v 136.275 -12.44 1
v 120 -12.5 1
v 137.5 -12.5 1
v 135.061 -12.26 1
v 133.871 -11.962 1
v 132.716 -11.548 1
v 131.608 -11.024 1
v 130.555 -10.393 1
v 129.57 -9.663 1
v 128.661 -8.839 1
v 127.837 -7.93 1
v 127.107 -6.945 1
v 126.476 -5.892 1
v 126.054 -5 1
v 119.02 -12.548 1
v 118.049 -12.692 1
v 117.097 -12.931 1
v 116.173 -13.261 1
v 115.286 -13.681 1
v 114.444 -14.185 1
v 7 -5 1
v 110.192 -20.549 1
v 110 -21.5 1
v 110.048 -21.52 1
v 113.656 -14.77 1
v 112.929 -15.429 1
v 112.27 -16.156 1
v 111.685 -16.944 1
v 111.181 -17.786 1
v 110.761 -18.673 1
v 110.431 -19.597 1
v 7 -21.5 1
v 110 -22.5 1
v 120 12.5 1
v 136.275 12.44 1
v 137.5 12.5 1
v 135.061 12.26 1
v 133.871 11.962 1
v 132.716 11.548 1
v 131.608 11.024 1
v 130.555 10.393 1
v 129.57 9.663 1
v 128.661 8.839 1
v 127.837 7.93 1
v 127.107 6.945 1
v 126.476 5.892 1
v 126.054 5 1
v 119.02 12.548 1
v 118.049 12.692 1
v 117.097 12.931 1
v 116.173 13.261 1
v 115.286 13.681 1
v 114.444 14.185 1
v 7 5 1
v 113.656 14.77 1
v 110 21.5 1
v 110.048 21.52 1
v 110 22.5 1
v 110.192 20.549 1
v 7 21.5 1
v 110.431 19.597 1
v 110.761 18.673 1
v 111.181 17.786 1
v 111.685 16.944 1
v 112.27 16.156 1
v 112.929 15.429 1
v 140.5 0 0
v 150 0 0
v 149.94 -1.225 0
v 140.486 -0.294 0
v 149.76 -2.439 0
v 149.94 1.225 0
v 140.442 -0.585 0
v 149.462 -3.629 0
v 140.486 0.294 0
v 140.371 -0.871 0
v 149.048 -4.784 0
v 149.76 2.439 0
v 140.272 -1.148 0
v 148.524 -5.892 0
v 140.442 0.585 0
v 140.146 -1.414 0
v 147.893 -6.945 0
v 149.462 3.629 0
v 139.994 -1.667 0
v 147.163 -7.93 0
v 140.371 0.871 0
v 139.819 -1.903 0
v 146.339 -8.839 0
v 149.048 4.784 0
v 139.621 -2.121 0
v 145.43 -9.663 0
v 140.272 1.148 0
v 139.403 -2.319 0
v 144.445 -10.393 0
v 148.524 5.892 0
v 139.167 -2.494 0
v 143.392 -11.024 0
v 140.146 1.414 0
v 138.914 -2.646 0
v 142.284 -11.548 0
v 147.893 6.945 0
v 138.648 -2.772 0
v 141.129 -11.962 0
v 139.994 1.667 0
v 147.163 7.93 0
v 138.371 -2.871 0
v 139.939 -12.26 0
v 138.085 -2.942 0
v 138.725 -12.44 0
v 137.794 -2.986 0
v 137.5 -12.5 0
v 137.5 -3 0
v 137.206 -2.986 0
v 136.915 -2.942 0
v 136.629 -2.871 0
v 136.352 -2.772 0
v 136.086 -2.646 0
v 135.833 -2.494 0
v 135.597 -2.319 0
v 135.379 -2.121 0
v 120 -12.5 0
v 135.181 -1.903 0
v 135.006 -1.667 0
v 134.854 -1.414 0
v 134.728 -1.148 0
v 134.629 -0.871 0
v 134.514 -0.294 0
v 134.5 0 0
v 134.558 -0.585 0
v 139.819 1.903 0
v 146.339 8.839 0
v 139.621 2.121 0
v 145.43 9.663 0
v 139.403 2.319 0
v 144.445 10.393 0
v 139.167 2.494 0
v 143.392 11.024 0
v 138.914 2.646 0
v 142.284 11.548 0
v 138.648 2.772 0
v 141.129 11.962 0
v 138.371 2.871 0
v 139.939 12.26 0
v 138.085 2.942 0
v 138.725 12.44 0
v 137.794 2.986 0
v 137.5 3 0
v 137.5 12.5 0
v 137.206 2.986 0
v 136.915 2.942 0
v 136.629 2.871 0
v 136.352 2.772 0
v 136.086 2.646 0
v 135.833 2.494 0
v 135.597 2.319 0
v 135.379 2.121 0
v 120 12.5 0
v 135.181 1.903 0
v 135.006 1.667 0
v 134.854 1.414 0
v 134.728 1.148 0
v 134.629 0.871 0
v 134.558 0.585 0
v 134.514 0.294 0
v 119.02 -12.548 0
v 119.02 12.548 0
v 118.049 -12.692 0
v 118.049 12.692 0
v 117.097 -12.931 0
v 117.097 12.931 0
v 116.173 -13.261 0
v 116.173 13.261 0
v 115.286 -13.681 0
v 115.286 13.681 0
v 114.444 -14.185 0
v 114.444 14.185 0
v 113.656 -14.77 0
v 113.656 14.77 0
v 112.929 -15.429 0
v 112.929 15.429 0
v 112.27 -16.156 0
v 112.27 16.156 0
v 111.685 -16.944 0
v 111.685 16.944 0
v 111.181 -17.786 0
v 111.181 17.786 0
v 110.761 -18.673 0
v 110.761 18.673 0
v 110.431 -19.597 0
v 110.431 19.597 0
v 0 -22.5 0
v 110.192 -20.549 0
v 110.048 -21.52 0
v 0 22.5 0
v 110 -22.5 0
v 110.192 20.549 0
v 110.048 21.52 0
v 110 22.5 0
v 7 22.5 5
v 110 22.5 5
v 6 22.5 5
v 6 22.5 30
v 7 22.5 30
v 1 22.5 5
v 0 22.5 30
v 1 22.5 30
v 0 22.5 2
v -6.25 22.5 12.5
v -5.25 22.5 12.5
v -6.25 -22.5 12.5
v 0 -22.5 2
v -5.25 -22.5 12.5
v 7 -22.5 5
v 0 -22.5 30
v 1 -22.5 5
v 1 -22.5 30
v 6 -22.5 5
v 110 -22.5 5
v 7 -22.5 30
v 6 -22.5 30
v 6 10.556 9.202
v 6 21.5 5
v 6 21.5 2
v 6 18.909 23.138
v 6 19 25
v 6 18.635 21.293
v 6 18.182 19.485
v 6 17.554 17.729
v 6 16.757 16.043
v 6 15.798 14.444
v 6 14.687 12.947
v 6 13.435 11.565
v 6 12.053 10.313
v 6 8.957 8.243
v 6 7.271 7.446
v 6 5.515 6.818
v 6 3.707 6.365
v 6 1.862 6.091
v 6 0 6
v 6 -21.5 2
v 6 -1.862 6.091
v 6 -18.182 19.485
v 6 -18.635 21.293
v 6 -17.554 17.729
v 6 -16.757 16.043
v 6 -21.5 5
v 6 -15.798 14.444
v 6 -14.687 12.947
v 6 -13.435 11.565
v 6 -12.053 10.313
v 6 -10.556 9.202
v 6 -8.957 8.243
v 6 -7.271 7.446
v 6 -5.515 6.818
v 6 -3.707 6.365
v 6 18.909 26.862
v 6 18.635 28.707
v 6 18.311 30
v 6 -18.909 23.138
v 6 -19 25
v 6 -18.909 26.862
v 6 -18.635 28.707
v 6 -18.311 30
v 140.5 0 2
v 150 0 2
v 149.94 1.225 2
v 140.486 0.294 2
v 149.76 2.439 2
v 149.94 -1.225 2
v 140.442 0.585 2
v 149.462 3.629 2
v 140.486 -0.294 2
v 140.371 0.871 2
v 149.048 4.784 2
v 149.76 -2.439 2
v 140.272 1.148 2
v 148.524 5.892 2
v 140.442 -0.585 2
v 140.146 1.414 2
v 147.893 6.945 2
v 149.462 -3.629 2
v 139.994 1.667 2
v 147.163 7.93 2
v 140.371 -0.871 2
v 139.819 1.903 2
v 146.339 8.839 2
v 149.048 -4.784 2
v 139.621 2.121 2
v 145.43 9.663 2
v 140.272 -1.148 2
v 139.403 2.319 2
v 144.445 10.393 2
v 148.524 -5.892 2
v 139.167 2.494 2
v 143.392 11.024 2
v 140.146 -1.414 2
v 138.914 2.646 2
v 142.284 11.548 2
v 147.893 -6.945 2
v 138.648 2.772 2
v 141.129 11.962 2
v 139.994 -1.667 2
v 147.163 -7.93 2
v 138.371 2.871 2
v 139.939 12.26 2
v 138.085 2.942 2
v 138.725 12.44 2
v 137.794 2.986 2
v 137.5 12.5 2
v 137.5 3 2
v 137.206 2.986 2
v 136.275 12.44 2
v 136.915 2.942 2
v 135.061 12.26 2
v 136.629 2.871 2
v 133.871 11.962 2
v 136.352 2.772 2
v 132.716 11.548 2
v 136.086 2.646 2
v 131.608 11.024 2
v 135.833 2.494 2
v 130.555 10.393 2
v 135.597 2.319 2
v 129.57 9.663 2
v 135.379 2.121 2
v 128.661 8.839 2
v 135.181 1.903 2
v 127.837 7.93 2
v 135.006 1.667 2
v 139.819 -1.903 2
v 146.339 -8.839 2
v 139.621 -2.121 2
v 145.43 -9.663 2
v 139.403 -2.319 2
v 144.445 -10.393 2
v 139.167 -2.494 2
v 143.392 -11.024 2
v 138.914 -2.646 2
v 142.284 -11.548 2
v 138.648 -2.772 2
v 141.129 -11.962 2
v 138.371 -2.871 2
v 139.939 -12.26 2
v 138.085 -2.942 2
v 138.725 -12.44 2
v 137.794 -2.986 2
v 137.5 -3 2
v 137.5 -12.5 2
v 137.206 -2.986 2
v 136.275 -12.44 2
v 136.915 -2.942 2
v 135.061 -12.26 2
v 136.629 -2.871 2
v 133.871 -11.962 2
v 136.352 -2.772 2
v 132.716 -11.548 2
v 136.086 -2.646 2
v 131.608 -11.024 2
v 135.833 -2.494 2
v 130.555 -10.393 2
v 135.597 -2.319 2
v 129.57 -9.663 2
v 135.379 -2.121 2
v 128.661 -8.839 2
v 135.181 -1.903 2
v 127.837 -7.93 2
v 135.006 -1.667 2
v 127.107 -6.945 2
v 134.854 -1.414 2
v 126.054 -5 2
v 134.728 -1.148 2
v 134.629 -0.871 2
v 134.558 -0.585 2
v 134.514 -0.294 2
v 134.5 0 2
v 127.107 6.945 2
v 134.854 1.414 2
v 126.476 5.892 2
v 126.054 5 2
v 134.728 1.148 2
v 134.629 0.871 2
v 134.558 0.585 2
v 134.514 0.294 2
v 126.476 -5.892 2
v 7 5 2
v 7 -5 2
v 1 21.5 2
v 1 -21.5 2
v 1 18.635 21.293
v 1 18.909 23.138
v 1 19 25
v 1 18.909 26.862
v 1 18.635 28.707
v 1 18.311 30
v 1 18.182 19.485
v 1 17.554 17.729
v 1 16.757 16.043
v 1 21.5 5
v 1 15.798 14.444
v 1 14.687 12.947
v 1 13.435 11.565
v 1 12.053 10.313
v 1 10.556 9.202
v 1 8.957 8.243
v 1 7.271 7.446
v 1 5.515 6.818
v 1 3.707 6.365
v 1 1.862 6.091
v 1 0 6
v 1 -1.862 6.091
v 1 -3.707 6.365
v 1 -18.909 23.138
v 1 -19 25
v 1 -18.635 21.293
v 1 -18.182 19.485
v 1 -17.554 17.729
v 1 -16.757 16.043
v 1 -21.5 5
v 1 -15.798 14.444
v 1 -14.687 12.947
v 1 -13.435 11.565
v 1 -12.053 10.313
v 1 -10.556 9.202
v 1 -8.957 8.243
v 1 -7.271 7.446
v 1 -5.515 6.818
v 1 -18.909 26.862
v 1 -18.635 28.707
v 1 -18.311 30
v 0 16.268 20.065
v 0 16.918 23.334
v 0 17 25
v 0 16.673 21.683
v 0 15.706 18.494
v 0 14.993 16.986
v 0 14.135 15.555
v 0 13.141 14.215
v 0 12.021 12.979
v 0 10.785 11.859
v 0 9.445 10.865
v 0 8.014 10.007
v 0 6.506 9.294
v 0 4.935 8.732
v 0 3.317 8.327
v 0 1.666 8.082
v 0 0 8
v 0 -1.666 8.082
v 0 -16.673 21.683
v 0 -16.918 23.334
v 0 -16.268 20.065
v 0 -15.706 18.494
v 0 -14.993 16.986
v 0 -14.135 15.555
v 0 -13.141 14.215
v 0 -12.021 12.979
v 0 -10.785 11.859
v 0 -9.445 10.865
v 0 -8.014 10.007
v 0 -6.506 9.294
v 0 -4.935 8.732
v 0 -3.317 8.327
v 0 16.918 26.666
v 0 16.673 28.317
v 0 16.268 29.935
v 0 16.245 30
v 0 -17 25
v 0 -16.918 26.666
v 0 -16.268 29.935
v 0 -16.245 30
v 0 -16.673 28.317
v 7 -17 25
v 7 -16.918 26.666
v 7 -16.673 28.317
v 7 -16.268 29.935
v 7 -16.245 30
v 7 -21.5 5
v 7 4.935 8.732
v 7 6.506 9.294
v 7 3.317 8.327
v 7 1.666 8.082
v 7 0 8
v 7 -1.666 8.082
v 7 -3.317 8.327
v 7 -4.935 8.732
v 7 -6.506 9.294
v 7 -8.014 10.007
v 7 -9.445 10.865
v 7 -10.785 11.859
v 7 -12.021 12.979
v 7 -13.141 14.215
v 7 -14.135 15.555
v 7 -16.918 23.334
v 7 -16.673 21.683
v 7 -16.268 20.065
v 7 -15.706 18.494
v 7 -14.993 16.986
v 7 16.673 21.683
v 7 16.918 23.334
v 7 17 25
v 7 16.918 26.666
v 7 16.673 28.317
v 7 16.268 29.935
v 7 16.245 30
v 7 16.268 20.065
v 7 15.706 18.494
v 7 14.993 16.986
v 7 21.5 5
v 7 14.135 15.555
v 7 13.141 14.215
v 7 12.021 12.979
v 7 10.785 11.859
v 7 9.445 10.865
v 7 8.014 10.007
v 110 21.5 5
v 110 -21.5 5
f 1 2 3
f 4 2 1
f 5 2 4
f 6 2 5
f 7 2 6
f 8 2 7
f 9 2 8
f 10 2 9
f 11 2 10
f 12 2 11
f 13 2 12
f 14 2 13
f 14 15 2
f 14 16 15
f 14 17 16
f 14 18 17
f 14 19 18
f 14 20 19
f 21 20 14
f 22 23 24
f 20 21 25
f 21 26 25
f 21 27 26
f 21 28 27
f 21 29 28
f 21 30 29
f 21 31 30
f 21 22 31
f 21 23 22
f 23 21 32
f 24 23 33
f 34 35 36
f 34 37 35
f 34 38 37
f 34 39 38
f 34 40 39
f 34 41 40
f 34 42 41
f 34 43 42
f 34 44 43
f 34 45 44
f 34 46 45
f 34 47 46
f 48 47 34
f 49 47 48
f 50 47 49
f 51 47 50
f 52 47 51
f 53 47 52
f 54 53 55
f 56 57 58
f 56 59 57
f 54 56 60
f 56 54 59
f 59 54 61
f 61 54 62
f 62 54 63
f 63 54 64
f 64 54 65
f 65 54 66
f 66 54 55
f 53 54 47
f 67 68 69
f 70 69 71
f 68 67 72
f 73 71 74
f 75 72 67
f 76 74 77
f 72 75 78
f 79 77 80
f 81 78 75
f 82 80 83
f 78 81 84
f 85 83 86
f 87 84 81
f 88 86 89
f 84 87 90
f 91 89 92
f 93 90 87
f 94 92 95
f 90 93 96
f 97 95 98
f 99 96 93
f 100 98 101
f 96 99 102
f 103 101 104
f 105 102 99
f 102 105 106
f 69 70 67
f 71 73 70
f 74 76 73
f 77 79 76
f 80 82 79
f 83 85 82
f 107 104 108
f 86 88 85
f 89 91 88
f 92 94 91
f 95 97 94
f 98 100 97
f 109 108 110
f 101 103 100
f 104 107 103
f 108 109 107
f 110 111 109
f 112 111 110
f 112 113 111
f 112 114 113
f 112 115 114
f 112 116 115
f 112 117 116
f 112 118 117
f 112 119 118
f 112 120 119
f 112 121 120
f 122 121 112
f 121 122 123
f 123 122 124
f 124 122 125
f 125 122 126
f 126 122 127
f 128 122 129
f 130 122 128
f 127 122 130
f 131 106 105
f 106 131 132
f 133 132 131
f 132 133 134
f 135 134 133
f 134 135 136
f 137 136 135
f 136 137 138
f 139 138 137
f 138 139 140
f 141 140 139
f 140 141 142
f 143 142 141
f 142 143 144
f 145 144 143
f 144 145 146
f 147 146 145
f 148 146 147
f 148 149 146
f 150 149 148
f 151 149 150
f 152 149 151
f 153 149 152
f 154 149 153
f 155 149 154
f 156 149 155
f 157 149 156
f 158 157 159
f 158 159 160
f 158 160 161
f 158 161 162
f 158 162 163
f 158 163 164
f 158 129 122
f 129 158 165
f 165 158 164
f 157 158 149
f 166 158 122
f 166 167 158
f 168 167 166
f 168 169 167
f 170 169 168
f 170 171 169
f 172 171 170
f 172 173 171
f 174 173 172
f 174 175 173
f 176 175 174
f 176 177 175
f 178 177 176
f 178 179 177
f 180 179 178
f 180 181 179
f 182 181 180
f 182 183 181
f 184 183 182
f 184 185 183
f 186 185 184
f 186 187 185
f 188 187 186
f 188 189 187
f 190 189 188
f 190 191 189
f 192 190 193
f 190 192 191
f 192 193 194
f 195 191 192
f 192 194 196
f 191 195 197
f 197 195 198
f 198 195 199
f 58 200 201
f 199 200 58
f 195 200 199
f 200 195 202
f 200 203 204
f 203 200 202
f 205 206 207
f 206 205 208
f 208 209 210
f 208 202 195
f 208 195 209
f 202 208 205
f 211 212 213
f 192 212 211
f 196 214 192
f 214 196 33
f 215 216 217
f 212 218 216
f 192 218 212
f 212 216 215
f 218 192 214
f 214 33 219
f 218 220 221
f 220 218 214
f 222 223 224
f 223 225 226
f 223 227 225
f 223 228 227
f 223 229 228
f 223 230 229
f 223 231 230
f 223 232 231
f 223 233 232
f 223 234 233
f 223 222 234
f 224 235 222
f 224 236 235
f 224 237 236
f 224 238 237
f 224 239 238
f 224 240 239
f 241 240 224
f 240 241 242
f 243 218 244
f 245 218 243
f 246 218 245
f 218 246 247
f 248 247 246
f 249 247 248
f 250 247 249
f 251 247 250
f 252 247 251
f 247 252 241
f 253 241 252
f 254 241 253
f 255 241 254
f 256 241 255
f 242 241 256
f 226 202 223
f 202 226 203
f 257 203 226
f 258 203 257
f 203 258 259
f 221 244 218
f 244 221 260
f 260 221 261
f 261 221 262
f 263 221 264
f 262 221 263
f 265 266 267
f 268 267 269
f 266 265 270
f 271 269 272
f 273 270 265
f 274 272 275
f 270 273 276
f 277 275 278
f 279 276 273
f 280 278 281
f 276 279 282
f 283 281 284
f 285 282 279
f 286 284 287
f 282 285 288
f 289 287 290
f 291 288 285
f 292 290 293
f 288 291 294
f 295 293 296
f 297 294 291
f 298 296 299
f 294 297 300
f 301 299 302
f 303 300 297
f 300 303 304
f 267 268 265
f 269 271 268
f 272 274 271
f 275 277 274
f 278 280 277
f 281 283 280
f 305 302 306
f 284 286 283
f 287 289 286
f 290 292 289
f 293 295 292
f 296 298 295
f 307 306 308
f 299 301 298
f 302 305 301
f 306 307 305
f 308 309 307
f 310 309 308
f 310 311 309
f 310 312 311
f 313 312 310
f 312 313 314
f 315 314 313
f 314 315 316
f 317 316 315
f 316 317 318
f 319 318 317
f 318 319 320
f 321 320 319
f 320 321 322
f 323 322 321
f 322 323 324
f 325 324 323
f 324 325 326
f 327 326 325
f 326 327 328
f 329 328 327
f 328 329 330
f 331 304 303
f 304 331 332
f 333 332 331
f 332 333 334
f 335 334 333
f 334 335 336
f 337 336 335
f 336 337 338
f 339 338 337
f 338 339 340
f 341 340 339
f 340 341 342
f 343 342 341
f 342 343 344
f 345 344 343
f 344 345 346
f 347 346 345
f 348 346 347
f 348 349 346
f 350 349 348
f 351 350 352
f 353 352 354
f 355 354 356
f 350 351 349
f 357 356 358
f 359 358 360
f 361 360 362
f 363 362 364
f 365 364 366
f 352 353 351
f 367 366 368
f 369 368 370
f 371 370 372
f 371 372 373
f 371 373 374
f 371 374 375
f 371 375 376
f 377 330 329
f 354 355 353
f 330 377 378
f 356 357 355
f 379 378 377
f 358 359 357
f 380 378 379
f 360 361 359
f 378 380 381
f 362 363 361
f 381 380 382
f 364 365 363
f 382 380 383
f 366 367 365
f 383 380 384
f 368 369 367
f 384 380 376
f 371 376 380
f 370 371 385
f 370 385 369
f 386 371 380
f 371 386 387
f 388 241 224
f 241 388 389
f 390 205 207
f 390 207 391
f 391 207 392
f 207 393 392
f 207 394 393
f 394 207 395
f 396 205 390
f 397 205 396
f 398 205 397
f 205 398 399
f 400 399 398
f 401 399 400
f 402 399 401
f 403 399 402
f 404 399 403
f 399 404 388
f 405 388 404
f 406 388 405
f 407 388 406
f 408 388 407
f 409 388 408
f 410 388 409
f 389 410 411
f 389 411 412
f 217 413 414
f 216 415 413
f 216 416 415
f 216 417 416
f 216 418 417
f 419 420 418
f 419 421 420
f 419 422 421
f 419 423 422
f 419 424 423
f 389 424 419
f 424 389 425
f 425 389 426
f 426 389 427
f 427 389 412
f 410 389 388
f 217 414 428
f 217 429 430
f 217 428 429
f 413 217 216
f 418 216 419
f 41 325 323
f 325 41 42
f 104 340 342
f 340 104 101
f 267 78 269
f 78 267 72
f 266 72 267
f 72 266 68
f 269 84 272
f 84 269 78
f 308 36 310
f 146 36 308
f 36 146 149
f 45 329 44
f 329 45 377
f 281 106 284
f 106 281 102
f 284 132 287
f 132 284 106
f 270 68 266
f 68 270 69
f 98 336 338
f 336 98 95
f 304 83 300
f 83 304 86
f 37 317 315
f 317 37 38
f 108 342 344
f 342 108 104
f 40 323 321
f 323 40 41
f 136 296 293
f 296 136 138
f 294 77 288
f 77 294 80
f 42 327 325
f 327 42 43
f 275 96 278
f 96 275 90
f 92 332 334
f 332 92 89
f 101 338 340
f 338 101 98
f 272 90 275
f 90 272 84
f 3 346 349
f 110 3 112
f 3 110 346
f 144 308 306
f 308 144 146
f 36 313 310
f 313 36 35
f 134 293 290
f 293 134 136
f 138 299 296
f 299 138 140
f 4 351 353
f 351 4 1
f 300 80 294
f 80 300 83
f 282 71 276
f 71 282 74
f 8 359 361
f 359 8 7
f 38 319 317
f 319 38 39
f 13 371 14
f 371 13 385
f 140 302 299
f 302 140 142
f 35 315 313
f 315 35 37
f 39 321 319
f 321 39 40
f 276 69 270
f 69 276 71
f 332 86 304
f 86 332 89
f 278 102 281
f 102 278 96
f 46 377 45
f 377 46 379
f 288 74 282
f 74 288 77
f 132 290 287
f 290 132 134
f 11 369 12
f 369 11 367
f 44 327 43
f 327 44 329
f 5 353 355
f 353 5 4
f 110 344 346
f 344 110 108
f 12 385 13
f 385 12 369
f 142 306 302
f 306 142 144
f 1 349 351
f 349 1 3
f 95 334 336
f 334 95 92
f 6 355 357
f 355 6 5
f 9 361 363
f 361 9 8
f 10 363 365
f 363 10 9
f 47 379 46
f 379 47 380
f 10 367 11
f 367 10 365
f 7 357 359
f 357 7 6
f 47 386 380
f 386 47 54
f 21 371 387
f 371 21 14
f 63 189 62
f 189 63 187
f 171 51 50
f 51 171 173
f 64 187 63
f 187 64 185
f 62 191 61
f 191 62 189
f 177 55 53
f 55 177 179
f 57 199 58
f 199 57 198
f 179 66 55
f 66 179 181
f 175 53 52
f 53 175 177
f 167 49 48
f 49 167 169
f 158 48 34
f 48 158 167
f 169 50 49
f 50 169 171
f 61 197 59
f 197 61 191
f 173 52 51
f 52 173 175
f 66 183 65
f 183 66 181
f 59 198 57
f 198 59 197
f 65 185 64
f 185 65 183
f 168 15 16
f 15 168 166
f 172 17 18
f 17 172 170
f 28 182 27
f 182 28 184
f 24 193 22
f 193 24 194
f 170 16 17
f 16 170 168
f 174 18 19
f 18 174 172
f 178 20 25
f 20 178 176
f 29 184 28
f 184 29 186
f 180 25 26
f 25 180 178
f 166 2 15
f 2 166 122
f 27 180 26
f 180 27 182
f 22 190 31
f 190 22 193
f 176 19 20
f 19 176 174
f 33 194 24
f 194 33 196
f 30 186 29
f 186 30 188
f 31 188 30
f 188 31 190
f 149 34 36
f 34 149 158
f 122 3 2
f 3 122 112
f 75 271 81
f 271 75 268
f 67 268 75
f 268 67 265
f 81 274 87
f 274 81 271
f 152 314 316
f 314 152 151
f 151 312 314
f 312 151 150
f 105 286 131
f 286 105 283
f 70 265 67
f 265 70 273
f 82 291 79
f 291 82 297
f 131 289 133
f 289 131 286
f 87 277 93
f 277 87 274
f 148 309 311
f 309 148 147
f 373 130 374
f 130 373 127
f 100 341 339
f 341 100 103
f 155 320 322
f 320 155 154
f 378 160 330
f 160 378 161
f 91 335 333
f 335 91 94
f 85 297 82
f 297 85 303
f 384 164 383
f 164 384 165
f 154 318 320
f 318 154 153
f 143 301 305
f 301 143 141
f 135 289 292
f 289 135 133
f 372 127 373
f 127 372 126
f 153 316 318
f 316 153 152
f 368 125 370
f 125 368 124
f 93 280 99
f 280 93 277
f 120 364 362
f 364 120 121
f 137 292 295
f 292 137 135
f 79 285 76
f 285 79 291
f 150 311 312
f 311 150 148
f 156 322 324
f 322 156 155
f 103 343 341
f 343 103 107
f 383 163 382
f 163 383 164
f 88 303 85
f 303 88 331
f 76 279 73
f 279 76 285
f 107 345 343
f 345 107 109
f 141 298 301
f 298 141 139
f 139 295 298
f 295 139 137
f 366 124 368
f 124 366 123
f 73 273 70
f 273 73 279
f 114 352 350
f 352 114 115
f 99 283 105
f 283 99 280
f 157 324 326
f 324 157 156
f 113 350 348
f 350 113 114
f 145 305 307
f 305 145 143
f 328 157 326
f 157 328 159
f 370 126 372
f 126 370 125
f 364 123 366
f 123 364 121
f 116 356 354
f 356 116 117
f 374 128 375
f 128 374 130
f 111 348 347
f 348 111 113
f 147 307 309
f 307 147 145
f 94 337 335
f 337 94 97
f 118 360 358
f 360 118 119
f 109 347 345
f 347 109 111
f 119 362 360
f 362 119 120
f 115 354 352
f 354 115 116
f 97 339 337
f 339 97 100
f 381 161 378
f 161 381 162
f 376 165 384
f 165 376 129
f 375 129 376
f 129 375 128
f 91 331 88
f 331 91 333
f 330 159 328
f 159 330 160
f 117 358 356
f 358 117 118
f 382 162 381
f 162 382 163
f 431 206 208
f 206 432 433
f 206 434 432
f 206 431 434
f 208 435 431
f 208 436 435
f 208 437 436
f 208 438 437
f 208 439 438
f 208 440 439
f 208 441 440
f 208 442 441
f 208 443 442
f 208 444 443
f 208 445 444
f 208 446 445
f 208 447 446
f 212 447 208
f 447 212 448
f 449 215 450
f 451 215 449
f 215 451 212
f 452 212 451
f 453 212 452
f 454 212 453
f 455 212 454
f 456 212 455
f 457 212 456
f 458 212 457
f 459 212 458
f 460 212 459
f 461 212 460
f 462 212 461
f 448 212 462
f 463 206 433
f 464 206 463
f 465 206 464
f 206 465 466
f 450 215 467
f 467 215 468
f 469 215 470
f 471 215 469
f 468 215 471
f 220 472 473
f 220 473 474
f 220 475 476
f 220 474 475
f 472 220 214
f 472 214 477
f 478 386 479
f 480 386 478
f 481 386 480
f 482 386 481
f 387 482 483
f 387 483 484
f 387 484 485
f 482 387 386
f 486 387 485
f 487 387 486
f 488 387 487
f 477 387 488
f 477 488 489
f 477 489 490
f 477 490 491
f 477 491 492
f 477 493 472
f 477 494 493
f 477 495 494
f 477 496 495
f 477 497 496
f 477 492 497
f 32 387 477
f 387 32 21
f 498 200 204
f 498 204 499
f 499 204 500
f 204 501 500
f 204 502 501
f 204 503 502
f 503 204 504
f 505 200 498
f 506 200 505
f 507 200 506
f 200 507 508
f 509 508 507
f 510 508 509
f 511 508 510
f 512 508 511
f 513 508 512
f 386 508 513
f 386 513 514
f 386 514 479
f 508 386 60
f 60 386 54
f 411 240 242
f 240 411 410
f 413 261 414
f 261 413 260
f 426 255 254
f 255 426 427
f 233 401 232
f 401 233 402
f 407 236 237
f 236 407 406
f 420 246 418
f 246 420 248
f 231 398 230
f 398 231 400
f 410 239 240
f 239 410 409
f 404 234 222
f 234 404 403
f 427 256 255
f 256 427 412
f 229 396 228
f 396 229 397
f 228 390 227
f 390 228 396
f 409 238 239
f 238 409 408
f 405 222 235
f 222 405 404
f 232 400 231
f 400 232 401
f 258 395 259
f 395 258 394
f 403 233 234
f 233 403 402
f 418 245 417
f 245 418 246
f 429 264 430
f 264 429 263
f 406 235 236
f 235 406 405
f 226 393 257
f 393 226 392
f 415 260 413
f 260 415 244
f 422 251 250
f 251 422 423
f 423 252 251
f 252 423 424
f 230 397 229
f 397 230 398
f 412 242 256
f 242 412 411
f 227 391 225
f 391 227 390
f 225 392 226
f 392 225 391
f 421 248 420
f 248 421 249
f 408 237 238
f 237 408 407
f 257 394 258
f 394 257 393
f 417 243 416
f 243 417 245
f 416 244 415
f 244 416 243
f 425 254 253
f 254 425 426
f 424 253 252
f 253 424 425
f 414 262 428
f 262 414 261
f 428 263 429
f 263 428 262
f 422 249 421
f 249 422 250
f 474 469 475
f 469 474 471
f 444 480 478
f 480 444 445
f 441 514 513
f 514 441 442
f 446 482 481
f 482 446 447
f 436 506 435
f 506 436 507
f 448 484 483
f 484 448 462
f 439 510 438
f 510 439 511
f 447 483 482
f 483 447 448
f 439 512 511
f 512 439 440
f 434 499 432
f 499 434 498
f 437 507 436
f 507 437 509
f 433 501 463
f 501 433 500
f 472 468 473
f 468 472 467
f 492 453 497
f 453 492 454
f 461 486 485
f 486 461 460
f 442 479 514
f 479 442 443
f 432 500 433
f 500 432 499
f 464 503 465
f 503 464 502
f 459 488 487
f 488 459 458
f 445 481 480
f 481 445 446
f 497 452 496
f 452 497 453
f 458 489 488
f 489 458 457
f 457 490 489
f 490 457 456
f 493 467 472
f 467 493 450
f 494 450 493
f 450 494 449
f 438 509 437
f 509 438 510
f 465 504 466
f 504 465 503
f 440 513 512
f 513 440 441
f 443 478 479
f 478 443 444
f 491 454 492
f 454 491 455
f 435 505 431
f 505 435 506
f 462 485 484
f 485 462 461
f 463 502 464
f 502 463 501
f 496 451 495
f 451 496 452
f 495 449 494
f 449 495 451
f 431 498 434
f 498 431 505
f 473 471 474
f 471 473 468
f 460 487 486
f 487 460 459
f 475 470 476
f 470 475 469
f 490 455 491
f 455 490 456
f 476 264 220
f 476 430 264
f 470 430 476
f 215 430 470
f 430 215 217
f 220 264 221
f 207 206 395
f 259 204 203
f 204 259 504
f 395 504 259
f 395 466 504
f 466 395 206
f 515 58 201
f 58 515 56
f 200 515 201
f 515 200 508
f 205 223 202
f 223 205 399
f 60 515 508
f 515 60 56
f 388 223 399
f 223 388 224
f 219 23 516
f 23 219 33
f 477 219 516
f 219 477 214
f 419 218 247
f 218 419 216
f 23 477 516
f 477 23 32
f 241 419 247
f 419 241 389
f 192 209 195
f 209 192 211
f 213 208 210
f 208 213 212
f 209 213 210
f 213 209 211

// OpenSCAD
// mini derailleur mudguard
//
// cable ties to set post above derailleur and
// screws to the chain stay bridge mudguard hole
//
// print in flexy TPU or similar


seat_dia = 34;     // seat tube outer diameter

post_offset = 25;  // offset from center of seat post to guard, to clear derailleur

extra_wrap = 5; // extra wrap around seatpost

gap = 5;      // gap for a cable tie around the seat tube

length = 150;  // overall length including nose

width = 45;  // overall width

nose_width = 25;  // nose between chain stays
nose_length = 30;  // offset to reach retaining screw
nose_hole = 6;     // hole for retaining screw

thickness = 1;  // main thickness

// probably doesn't make sense to have both side walls and the extra thick bit.
 
extra_width=10; // extra thick part along middle
extra_thick=2; // thickness of thicker parts

walls = 5; // side walls,


$fn=64;


difference() {
    union() {
        translate([0,-width/2,0])cube([length-nose_width/2, width, thickness]);
        translate([thickness,-width/2,0])cube([gap, width, extra_thick]);
        translate([length-nose_width/2,0,0]) cylinder(d=nose_width,h=extra_thick);
        translate([0,-extra_width/2,0]) cube([length-nose_width/2, extra_width, extra_thick]);
        }
    translate([length-nose_length,width/2,-1]) cylinder(r=(width-nose_width)/2,h=thickness+2);
    translate([length-nose_length,-width/2,-1]) cylinder(r=(width-nose_width)/2,h=thickness+2);
    translate([length-nose_length,nose_width/2,-1]) cube([length, width, thickness+2]);
   translate([length-nose_length,-width-nose_width/2,-1]) cube([length, width, thickness+2]);
    translate([length - nose_width/2,0,-1]) cylinder(d=nose_hole, h=extra_thick+2); 
}

translate([0,width/2-thickness,0]) cube([length-nose_length-width/2+nose_width/2, thickness, walls]);
translate([0,-width/2,0]) cube([length-nose_length-width/2+nose_width/2, thickness, walls]);

translate([0, -width/2, 0]) multmatrix([
        [1,0,-0.5,0],[0,1,0,0],[0,0,1,0]])
cube([thickness, width, 12.5]);

difference() {
   union() {
   translate([0, -width/2,0]) cube([thickness, width, post_offset*2]);
   translate([thickness+gap, -width/2,0]) cube([thickness, width, post_offset*2]);
   translate([0,0,post_offset])rotate([0,90,0]) cylinder(d=seat_dia+thickness*4,h=thickness*2+gap);
   }
   translate([-1,0,post_offset])rotate([0,90,0]) cylinder(d=seat_dia,h=thickness*2+gap+2);
   translate([-1,-width/2-1,post_offset+extra_wrap]) cube([thickness*2+gap+2,width+2,post_offset]);
}
